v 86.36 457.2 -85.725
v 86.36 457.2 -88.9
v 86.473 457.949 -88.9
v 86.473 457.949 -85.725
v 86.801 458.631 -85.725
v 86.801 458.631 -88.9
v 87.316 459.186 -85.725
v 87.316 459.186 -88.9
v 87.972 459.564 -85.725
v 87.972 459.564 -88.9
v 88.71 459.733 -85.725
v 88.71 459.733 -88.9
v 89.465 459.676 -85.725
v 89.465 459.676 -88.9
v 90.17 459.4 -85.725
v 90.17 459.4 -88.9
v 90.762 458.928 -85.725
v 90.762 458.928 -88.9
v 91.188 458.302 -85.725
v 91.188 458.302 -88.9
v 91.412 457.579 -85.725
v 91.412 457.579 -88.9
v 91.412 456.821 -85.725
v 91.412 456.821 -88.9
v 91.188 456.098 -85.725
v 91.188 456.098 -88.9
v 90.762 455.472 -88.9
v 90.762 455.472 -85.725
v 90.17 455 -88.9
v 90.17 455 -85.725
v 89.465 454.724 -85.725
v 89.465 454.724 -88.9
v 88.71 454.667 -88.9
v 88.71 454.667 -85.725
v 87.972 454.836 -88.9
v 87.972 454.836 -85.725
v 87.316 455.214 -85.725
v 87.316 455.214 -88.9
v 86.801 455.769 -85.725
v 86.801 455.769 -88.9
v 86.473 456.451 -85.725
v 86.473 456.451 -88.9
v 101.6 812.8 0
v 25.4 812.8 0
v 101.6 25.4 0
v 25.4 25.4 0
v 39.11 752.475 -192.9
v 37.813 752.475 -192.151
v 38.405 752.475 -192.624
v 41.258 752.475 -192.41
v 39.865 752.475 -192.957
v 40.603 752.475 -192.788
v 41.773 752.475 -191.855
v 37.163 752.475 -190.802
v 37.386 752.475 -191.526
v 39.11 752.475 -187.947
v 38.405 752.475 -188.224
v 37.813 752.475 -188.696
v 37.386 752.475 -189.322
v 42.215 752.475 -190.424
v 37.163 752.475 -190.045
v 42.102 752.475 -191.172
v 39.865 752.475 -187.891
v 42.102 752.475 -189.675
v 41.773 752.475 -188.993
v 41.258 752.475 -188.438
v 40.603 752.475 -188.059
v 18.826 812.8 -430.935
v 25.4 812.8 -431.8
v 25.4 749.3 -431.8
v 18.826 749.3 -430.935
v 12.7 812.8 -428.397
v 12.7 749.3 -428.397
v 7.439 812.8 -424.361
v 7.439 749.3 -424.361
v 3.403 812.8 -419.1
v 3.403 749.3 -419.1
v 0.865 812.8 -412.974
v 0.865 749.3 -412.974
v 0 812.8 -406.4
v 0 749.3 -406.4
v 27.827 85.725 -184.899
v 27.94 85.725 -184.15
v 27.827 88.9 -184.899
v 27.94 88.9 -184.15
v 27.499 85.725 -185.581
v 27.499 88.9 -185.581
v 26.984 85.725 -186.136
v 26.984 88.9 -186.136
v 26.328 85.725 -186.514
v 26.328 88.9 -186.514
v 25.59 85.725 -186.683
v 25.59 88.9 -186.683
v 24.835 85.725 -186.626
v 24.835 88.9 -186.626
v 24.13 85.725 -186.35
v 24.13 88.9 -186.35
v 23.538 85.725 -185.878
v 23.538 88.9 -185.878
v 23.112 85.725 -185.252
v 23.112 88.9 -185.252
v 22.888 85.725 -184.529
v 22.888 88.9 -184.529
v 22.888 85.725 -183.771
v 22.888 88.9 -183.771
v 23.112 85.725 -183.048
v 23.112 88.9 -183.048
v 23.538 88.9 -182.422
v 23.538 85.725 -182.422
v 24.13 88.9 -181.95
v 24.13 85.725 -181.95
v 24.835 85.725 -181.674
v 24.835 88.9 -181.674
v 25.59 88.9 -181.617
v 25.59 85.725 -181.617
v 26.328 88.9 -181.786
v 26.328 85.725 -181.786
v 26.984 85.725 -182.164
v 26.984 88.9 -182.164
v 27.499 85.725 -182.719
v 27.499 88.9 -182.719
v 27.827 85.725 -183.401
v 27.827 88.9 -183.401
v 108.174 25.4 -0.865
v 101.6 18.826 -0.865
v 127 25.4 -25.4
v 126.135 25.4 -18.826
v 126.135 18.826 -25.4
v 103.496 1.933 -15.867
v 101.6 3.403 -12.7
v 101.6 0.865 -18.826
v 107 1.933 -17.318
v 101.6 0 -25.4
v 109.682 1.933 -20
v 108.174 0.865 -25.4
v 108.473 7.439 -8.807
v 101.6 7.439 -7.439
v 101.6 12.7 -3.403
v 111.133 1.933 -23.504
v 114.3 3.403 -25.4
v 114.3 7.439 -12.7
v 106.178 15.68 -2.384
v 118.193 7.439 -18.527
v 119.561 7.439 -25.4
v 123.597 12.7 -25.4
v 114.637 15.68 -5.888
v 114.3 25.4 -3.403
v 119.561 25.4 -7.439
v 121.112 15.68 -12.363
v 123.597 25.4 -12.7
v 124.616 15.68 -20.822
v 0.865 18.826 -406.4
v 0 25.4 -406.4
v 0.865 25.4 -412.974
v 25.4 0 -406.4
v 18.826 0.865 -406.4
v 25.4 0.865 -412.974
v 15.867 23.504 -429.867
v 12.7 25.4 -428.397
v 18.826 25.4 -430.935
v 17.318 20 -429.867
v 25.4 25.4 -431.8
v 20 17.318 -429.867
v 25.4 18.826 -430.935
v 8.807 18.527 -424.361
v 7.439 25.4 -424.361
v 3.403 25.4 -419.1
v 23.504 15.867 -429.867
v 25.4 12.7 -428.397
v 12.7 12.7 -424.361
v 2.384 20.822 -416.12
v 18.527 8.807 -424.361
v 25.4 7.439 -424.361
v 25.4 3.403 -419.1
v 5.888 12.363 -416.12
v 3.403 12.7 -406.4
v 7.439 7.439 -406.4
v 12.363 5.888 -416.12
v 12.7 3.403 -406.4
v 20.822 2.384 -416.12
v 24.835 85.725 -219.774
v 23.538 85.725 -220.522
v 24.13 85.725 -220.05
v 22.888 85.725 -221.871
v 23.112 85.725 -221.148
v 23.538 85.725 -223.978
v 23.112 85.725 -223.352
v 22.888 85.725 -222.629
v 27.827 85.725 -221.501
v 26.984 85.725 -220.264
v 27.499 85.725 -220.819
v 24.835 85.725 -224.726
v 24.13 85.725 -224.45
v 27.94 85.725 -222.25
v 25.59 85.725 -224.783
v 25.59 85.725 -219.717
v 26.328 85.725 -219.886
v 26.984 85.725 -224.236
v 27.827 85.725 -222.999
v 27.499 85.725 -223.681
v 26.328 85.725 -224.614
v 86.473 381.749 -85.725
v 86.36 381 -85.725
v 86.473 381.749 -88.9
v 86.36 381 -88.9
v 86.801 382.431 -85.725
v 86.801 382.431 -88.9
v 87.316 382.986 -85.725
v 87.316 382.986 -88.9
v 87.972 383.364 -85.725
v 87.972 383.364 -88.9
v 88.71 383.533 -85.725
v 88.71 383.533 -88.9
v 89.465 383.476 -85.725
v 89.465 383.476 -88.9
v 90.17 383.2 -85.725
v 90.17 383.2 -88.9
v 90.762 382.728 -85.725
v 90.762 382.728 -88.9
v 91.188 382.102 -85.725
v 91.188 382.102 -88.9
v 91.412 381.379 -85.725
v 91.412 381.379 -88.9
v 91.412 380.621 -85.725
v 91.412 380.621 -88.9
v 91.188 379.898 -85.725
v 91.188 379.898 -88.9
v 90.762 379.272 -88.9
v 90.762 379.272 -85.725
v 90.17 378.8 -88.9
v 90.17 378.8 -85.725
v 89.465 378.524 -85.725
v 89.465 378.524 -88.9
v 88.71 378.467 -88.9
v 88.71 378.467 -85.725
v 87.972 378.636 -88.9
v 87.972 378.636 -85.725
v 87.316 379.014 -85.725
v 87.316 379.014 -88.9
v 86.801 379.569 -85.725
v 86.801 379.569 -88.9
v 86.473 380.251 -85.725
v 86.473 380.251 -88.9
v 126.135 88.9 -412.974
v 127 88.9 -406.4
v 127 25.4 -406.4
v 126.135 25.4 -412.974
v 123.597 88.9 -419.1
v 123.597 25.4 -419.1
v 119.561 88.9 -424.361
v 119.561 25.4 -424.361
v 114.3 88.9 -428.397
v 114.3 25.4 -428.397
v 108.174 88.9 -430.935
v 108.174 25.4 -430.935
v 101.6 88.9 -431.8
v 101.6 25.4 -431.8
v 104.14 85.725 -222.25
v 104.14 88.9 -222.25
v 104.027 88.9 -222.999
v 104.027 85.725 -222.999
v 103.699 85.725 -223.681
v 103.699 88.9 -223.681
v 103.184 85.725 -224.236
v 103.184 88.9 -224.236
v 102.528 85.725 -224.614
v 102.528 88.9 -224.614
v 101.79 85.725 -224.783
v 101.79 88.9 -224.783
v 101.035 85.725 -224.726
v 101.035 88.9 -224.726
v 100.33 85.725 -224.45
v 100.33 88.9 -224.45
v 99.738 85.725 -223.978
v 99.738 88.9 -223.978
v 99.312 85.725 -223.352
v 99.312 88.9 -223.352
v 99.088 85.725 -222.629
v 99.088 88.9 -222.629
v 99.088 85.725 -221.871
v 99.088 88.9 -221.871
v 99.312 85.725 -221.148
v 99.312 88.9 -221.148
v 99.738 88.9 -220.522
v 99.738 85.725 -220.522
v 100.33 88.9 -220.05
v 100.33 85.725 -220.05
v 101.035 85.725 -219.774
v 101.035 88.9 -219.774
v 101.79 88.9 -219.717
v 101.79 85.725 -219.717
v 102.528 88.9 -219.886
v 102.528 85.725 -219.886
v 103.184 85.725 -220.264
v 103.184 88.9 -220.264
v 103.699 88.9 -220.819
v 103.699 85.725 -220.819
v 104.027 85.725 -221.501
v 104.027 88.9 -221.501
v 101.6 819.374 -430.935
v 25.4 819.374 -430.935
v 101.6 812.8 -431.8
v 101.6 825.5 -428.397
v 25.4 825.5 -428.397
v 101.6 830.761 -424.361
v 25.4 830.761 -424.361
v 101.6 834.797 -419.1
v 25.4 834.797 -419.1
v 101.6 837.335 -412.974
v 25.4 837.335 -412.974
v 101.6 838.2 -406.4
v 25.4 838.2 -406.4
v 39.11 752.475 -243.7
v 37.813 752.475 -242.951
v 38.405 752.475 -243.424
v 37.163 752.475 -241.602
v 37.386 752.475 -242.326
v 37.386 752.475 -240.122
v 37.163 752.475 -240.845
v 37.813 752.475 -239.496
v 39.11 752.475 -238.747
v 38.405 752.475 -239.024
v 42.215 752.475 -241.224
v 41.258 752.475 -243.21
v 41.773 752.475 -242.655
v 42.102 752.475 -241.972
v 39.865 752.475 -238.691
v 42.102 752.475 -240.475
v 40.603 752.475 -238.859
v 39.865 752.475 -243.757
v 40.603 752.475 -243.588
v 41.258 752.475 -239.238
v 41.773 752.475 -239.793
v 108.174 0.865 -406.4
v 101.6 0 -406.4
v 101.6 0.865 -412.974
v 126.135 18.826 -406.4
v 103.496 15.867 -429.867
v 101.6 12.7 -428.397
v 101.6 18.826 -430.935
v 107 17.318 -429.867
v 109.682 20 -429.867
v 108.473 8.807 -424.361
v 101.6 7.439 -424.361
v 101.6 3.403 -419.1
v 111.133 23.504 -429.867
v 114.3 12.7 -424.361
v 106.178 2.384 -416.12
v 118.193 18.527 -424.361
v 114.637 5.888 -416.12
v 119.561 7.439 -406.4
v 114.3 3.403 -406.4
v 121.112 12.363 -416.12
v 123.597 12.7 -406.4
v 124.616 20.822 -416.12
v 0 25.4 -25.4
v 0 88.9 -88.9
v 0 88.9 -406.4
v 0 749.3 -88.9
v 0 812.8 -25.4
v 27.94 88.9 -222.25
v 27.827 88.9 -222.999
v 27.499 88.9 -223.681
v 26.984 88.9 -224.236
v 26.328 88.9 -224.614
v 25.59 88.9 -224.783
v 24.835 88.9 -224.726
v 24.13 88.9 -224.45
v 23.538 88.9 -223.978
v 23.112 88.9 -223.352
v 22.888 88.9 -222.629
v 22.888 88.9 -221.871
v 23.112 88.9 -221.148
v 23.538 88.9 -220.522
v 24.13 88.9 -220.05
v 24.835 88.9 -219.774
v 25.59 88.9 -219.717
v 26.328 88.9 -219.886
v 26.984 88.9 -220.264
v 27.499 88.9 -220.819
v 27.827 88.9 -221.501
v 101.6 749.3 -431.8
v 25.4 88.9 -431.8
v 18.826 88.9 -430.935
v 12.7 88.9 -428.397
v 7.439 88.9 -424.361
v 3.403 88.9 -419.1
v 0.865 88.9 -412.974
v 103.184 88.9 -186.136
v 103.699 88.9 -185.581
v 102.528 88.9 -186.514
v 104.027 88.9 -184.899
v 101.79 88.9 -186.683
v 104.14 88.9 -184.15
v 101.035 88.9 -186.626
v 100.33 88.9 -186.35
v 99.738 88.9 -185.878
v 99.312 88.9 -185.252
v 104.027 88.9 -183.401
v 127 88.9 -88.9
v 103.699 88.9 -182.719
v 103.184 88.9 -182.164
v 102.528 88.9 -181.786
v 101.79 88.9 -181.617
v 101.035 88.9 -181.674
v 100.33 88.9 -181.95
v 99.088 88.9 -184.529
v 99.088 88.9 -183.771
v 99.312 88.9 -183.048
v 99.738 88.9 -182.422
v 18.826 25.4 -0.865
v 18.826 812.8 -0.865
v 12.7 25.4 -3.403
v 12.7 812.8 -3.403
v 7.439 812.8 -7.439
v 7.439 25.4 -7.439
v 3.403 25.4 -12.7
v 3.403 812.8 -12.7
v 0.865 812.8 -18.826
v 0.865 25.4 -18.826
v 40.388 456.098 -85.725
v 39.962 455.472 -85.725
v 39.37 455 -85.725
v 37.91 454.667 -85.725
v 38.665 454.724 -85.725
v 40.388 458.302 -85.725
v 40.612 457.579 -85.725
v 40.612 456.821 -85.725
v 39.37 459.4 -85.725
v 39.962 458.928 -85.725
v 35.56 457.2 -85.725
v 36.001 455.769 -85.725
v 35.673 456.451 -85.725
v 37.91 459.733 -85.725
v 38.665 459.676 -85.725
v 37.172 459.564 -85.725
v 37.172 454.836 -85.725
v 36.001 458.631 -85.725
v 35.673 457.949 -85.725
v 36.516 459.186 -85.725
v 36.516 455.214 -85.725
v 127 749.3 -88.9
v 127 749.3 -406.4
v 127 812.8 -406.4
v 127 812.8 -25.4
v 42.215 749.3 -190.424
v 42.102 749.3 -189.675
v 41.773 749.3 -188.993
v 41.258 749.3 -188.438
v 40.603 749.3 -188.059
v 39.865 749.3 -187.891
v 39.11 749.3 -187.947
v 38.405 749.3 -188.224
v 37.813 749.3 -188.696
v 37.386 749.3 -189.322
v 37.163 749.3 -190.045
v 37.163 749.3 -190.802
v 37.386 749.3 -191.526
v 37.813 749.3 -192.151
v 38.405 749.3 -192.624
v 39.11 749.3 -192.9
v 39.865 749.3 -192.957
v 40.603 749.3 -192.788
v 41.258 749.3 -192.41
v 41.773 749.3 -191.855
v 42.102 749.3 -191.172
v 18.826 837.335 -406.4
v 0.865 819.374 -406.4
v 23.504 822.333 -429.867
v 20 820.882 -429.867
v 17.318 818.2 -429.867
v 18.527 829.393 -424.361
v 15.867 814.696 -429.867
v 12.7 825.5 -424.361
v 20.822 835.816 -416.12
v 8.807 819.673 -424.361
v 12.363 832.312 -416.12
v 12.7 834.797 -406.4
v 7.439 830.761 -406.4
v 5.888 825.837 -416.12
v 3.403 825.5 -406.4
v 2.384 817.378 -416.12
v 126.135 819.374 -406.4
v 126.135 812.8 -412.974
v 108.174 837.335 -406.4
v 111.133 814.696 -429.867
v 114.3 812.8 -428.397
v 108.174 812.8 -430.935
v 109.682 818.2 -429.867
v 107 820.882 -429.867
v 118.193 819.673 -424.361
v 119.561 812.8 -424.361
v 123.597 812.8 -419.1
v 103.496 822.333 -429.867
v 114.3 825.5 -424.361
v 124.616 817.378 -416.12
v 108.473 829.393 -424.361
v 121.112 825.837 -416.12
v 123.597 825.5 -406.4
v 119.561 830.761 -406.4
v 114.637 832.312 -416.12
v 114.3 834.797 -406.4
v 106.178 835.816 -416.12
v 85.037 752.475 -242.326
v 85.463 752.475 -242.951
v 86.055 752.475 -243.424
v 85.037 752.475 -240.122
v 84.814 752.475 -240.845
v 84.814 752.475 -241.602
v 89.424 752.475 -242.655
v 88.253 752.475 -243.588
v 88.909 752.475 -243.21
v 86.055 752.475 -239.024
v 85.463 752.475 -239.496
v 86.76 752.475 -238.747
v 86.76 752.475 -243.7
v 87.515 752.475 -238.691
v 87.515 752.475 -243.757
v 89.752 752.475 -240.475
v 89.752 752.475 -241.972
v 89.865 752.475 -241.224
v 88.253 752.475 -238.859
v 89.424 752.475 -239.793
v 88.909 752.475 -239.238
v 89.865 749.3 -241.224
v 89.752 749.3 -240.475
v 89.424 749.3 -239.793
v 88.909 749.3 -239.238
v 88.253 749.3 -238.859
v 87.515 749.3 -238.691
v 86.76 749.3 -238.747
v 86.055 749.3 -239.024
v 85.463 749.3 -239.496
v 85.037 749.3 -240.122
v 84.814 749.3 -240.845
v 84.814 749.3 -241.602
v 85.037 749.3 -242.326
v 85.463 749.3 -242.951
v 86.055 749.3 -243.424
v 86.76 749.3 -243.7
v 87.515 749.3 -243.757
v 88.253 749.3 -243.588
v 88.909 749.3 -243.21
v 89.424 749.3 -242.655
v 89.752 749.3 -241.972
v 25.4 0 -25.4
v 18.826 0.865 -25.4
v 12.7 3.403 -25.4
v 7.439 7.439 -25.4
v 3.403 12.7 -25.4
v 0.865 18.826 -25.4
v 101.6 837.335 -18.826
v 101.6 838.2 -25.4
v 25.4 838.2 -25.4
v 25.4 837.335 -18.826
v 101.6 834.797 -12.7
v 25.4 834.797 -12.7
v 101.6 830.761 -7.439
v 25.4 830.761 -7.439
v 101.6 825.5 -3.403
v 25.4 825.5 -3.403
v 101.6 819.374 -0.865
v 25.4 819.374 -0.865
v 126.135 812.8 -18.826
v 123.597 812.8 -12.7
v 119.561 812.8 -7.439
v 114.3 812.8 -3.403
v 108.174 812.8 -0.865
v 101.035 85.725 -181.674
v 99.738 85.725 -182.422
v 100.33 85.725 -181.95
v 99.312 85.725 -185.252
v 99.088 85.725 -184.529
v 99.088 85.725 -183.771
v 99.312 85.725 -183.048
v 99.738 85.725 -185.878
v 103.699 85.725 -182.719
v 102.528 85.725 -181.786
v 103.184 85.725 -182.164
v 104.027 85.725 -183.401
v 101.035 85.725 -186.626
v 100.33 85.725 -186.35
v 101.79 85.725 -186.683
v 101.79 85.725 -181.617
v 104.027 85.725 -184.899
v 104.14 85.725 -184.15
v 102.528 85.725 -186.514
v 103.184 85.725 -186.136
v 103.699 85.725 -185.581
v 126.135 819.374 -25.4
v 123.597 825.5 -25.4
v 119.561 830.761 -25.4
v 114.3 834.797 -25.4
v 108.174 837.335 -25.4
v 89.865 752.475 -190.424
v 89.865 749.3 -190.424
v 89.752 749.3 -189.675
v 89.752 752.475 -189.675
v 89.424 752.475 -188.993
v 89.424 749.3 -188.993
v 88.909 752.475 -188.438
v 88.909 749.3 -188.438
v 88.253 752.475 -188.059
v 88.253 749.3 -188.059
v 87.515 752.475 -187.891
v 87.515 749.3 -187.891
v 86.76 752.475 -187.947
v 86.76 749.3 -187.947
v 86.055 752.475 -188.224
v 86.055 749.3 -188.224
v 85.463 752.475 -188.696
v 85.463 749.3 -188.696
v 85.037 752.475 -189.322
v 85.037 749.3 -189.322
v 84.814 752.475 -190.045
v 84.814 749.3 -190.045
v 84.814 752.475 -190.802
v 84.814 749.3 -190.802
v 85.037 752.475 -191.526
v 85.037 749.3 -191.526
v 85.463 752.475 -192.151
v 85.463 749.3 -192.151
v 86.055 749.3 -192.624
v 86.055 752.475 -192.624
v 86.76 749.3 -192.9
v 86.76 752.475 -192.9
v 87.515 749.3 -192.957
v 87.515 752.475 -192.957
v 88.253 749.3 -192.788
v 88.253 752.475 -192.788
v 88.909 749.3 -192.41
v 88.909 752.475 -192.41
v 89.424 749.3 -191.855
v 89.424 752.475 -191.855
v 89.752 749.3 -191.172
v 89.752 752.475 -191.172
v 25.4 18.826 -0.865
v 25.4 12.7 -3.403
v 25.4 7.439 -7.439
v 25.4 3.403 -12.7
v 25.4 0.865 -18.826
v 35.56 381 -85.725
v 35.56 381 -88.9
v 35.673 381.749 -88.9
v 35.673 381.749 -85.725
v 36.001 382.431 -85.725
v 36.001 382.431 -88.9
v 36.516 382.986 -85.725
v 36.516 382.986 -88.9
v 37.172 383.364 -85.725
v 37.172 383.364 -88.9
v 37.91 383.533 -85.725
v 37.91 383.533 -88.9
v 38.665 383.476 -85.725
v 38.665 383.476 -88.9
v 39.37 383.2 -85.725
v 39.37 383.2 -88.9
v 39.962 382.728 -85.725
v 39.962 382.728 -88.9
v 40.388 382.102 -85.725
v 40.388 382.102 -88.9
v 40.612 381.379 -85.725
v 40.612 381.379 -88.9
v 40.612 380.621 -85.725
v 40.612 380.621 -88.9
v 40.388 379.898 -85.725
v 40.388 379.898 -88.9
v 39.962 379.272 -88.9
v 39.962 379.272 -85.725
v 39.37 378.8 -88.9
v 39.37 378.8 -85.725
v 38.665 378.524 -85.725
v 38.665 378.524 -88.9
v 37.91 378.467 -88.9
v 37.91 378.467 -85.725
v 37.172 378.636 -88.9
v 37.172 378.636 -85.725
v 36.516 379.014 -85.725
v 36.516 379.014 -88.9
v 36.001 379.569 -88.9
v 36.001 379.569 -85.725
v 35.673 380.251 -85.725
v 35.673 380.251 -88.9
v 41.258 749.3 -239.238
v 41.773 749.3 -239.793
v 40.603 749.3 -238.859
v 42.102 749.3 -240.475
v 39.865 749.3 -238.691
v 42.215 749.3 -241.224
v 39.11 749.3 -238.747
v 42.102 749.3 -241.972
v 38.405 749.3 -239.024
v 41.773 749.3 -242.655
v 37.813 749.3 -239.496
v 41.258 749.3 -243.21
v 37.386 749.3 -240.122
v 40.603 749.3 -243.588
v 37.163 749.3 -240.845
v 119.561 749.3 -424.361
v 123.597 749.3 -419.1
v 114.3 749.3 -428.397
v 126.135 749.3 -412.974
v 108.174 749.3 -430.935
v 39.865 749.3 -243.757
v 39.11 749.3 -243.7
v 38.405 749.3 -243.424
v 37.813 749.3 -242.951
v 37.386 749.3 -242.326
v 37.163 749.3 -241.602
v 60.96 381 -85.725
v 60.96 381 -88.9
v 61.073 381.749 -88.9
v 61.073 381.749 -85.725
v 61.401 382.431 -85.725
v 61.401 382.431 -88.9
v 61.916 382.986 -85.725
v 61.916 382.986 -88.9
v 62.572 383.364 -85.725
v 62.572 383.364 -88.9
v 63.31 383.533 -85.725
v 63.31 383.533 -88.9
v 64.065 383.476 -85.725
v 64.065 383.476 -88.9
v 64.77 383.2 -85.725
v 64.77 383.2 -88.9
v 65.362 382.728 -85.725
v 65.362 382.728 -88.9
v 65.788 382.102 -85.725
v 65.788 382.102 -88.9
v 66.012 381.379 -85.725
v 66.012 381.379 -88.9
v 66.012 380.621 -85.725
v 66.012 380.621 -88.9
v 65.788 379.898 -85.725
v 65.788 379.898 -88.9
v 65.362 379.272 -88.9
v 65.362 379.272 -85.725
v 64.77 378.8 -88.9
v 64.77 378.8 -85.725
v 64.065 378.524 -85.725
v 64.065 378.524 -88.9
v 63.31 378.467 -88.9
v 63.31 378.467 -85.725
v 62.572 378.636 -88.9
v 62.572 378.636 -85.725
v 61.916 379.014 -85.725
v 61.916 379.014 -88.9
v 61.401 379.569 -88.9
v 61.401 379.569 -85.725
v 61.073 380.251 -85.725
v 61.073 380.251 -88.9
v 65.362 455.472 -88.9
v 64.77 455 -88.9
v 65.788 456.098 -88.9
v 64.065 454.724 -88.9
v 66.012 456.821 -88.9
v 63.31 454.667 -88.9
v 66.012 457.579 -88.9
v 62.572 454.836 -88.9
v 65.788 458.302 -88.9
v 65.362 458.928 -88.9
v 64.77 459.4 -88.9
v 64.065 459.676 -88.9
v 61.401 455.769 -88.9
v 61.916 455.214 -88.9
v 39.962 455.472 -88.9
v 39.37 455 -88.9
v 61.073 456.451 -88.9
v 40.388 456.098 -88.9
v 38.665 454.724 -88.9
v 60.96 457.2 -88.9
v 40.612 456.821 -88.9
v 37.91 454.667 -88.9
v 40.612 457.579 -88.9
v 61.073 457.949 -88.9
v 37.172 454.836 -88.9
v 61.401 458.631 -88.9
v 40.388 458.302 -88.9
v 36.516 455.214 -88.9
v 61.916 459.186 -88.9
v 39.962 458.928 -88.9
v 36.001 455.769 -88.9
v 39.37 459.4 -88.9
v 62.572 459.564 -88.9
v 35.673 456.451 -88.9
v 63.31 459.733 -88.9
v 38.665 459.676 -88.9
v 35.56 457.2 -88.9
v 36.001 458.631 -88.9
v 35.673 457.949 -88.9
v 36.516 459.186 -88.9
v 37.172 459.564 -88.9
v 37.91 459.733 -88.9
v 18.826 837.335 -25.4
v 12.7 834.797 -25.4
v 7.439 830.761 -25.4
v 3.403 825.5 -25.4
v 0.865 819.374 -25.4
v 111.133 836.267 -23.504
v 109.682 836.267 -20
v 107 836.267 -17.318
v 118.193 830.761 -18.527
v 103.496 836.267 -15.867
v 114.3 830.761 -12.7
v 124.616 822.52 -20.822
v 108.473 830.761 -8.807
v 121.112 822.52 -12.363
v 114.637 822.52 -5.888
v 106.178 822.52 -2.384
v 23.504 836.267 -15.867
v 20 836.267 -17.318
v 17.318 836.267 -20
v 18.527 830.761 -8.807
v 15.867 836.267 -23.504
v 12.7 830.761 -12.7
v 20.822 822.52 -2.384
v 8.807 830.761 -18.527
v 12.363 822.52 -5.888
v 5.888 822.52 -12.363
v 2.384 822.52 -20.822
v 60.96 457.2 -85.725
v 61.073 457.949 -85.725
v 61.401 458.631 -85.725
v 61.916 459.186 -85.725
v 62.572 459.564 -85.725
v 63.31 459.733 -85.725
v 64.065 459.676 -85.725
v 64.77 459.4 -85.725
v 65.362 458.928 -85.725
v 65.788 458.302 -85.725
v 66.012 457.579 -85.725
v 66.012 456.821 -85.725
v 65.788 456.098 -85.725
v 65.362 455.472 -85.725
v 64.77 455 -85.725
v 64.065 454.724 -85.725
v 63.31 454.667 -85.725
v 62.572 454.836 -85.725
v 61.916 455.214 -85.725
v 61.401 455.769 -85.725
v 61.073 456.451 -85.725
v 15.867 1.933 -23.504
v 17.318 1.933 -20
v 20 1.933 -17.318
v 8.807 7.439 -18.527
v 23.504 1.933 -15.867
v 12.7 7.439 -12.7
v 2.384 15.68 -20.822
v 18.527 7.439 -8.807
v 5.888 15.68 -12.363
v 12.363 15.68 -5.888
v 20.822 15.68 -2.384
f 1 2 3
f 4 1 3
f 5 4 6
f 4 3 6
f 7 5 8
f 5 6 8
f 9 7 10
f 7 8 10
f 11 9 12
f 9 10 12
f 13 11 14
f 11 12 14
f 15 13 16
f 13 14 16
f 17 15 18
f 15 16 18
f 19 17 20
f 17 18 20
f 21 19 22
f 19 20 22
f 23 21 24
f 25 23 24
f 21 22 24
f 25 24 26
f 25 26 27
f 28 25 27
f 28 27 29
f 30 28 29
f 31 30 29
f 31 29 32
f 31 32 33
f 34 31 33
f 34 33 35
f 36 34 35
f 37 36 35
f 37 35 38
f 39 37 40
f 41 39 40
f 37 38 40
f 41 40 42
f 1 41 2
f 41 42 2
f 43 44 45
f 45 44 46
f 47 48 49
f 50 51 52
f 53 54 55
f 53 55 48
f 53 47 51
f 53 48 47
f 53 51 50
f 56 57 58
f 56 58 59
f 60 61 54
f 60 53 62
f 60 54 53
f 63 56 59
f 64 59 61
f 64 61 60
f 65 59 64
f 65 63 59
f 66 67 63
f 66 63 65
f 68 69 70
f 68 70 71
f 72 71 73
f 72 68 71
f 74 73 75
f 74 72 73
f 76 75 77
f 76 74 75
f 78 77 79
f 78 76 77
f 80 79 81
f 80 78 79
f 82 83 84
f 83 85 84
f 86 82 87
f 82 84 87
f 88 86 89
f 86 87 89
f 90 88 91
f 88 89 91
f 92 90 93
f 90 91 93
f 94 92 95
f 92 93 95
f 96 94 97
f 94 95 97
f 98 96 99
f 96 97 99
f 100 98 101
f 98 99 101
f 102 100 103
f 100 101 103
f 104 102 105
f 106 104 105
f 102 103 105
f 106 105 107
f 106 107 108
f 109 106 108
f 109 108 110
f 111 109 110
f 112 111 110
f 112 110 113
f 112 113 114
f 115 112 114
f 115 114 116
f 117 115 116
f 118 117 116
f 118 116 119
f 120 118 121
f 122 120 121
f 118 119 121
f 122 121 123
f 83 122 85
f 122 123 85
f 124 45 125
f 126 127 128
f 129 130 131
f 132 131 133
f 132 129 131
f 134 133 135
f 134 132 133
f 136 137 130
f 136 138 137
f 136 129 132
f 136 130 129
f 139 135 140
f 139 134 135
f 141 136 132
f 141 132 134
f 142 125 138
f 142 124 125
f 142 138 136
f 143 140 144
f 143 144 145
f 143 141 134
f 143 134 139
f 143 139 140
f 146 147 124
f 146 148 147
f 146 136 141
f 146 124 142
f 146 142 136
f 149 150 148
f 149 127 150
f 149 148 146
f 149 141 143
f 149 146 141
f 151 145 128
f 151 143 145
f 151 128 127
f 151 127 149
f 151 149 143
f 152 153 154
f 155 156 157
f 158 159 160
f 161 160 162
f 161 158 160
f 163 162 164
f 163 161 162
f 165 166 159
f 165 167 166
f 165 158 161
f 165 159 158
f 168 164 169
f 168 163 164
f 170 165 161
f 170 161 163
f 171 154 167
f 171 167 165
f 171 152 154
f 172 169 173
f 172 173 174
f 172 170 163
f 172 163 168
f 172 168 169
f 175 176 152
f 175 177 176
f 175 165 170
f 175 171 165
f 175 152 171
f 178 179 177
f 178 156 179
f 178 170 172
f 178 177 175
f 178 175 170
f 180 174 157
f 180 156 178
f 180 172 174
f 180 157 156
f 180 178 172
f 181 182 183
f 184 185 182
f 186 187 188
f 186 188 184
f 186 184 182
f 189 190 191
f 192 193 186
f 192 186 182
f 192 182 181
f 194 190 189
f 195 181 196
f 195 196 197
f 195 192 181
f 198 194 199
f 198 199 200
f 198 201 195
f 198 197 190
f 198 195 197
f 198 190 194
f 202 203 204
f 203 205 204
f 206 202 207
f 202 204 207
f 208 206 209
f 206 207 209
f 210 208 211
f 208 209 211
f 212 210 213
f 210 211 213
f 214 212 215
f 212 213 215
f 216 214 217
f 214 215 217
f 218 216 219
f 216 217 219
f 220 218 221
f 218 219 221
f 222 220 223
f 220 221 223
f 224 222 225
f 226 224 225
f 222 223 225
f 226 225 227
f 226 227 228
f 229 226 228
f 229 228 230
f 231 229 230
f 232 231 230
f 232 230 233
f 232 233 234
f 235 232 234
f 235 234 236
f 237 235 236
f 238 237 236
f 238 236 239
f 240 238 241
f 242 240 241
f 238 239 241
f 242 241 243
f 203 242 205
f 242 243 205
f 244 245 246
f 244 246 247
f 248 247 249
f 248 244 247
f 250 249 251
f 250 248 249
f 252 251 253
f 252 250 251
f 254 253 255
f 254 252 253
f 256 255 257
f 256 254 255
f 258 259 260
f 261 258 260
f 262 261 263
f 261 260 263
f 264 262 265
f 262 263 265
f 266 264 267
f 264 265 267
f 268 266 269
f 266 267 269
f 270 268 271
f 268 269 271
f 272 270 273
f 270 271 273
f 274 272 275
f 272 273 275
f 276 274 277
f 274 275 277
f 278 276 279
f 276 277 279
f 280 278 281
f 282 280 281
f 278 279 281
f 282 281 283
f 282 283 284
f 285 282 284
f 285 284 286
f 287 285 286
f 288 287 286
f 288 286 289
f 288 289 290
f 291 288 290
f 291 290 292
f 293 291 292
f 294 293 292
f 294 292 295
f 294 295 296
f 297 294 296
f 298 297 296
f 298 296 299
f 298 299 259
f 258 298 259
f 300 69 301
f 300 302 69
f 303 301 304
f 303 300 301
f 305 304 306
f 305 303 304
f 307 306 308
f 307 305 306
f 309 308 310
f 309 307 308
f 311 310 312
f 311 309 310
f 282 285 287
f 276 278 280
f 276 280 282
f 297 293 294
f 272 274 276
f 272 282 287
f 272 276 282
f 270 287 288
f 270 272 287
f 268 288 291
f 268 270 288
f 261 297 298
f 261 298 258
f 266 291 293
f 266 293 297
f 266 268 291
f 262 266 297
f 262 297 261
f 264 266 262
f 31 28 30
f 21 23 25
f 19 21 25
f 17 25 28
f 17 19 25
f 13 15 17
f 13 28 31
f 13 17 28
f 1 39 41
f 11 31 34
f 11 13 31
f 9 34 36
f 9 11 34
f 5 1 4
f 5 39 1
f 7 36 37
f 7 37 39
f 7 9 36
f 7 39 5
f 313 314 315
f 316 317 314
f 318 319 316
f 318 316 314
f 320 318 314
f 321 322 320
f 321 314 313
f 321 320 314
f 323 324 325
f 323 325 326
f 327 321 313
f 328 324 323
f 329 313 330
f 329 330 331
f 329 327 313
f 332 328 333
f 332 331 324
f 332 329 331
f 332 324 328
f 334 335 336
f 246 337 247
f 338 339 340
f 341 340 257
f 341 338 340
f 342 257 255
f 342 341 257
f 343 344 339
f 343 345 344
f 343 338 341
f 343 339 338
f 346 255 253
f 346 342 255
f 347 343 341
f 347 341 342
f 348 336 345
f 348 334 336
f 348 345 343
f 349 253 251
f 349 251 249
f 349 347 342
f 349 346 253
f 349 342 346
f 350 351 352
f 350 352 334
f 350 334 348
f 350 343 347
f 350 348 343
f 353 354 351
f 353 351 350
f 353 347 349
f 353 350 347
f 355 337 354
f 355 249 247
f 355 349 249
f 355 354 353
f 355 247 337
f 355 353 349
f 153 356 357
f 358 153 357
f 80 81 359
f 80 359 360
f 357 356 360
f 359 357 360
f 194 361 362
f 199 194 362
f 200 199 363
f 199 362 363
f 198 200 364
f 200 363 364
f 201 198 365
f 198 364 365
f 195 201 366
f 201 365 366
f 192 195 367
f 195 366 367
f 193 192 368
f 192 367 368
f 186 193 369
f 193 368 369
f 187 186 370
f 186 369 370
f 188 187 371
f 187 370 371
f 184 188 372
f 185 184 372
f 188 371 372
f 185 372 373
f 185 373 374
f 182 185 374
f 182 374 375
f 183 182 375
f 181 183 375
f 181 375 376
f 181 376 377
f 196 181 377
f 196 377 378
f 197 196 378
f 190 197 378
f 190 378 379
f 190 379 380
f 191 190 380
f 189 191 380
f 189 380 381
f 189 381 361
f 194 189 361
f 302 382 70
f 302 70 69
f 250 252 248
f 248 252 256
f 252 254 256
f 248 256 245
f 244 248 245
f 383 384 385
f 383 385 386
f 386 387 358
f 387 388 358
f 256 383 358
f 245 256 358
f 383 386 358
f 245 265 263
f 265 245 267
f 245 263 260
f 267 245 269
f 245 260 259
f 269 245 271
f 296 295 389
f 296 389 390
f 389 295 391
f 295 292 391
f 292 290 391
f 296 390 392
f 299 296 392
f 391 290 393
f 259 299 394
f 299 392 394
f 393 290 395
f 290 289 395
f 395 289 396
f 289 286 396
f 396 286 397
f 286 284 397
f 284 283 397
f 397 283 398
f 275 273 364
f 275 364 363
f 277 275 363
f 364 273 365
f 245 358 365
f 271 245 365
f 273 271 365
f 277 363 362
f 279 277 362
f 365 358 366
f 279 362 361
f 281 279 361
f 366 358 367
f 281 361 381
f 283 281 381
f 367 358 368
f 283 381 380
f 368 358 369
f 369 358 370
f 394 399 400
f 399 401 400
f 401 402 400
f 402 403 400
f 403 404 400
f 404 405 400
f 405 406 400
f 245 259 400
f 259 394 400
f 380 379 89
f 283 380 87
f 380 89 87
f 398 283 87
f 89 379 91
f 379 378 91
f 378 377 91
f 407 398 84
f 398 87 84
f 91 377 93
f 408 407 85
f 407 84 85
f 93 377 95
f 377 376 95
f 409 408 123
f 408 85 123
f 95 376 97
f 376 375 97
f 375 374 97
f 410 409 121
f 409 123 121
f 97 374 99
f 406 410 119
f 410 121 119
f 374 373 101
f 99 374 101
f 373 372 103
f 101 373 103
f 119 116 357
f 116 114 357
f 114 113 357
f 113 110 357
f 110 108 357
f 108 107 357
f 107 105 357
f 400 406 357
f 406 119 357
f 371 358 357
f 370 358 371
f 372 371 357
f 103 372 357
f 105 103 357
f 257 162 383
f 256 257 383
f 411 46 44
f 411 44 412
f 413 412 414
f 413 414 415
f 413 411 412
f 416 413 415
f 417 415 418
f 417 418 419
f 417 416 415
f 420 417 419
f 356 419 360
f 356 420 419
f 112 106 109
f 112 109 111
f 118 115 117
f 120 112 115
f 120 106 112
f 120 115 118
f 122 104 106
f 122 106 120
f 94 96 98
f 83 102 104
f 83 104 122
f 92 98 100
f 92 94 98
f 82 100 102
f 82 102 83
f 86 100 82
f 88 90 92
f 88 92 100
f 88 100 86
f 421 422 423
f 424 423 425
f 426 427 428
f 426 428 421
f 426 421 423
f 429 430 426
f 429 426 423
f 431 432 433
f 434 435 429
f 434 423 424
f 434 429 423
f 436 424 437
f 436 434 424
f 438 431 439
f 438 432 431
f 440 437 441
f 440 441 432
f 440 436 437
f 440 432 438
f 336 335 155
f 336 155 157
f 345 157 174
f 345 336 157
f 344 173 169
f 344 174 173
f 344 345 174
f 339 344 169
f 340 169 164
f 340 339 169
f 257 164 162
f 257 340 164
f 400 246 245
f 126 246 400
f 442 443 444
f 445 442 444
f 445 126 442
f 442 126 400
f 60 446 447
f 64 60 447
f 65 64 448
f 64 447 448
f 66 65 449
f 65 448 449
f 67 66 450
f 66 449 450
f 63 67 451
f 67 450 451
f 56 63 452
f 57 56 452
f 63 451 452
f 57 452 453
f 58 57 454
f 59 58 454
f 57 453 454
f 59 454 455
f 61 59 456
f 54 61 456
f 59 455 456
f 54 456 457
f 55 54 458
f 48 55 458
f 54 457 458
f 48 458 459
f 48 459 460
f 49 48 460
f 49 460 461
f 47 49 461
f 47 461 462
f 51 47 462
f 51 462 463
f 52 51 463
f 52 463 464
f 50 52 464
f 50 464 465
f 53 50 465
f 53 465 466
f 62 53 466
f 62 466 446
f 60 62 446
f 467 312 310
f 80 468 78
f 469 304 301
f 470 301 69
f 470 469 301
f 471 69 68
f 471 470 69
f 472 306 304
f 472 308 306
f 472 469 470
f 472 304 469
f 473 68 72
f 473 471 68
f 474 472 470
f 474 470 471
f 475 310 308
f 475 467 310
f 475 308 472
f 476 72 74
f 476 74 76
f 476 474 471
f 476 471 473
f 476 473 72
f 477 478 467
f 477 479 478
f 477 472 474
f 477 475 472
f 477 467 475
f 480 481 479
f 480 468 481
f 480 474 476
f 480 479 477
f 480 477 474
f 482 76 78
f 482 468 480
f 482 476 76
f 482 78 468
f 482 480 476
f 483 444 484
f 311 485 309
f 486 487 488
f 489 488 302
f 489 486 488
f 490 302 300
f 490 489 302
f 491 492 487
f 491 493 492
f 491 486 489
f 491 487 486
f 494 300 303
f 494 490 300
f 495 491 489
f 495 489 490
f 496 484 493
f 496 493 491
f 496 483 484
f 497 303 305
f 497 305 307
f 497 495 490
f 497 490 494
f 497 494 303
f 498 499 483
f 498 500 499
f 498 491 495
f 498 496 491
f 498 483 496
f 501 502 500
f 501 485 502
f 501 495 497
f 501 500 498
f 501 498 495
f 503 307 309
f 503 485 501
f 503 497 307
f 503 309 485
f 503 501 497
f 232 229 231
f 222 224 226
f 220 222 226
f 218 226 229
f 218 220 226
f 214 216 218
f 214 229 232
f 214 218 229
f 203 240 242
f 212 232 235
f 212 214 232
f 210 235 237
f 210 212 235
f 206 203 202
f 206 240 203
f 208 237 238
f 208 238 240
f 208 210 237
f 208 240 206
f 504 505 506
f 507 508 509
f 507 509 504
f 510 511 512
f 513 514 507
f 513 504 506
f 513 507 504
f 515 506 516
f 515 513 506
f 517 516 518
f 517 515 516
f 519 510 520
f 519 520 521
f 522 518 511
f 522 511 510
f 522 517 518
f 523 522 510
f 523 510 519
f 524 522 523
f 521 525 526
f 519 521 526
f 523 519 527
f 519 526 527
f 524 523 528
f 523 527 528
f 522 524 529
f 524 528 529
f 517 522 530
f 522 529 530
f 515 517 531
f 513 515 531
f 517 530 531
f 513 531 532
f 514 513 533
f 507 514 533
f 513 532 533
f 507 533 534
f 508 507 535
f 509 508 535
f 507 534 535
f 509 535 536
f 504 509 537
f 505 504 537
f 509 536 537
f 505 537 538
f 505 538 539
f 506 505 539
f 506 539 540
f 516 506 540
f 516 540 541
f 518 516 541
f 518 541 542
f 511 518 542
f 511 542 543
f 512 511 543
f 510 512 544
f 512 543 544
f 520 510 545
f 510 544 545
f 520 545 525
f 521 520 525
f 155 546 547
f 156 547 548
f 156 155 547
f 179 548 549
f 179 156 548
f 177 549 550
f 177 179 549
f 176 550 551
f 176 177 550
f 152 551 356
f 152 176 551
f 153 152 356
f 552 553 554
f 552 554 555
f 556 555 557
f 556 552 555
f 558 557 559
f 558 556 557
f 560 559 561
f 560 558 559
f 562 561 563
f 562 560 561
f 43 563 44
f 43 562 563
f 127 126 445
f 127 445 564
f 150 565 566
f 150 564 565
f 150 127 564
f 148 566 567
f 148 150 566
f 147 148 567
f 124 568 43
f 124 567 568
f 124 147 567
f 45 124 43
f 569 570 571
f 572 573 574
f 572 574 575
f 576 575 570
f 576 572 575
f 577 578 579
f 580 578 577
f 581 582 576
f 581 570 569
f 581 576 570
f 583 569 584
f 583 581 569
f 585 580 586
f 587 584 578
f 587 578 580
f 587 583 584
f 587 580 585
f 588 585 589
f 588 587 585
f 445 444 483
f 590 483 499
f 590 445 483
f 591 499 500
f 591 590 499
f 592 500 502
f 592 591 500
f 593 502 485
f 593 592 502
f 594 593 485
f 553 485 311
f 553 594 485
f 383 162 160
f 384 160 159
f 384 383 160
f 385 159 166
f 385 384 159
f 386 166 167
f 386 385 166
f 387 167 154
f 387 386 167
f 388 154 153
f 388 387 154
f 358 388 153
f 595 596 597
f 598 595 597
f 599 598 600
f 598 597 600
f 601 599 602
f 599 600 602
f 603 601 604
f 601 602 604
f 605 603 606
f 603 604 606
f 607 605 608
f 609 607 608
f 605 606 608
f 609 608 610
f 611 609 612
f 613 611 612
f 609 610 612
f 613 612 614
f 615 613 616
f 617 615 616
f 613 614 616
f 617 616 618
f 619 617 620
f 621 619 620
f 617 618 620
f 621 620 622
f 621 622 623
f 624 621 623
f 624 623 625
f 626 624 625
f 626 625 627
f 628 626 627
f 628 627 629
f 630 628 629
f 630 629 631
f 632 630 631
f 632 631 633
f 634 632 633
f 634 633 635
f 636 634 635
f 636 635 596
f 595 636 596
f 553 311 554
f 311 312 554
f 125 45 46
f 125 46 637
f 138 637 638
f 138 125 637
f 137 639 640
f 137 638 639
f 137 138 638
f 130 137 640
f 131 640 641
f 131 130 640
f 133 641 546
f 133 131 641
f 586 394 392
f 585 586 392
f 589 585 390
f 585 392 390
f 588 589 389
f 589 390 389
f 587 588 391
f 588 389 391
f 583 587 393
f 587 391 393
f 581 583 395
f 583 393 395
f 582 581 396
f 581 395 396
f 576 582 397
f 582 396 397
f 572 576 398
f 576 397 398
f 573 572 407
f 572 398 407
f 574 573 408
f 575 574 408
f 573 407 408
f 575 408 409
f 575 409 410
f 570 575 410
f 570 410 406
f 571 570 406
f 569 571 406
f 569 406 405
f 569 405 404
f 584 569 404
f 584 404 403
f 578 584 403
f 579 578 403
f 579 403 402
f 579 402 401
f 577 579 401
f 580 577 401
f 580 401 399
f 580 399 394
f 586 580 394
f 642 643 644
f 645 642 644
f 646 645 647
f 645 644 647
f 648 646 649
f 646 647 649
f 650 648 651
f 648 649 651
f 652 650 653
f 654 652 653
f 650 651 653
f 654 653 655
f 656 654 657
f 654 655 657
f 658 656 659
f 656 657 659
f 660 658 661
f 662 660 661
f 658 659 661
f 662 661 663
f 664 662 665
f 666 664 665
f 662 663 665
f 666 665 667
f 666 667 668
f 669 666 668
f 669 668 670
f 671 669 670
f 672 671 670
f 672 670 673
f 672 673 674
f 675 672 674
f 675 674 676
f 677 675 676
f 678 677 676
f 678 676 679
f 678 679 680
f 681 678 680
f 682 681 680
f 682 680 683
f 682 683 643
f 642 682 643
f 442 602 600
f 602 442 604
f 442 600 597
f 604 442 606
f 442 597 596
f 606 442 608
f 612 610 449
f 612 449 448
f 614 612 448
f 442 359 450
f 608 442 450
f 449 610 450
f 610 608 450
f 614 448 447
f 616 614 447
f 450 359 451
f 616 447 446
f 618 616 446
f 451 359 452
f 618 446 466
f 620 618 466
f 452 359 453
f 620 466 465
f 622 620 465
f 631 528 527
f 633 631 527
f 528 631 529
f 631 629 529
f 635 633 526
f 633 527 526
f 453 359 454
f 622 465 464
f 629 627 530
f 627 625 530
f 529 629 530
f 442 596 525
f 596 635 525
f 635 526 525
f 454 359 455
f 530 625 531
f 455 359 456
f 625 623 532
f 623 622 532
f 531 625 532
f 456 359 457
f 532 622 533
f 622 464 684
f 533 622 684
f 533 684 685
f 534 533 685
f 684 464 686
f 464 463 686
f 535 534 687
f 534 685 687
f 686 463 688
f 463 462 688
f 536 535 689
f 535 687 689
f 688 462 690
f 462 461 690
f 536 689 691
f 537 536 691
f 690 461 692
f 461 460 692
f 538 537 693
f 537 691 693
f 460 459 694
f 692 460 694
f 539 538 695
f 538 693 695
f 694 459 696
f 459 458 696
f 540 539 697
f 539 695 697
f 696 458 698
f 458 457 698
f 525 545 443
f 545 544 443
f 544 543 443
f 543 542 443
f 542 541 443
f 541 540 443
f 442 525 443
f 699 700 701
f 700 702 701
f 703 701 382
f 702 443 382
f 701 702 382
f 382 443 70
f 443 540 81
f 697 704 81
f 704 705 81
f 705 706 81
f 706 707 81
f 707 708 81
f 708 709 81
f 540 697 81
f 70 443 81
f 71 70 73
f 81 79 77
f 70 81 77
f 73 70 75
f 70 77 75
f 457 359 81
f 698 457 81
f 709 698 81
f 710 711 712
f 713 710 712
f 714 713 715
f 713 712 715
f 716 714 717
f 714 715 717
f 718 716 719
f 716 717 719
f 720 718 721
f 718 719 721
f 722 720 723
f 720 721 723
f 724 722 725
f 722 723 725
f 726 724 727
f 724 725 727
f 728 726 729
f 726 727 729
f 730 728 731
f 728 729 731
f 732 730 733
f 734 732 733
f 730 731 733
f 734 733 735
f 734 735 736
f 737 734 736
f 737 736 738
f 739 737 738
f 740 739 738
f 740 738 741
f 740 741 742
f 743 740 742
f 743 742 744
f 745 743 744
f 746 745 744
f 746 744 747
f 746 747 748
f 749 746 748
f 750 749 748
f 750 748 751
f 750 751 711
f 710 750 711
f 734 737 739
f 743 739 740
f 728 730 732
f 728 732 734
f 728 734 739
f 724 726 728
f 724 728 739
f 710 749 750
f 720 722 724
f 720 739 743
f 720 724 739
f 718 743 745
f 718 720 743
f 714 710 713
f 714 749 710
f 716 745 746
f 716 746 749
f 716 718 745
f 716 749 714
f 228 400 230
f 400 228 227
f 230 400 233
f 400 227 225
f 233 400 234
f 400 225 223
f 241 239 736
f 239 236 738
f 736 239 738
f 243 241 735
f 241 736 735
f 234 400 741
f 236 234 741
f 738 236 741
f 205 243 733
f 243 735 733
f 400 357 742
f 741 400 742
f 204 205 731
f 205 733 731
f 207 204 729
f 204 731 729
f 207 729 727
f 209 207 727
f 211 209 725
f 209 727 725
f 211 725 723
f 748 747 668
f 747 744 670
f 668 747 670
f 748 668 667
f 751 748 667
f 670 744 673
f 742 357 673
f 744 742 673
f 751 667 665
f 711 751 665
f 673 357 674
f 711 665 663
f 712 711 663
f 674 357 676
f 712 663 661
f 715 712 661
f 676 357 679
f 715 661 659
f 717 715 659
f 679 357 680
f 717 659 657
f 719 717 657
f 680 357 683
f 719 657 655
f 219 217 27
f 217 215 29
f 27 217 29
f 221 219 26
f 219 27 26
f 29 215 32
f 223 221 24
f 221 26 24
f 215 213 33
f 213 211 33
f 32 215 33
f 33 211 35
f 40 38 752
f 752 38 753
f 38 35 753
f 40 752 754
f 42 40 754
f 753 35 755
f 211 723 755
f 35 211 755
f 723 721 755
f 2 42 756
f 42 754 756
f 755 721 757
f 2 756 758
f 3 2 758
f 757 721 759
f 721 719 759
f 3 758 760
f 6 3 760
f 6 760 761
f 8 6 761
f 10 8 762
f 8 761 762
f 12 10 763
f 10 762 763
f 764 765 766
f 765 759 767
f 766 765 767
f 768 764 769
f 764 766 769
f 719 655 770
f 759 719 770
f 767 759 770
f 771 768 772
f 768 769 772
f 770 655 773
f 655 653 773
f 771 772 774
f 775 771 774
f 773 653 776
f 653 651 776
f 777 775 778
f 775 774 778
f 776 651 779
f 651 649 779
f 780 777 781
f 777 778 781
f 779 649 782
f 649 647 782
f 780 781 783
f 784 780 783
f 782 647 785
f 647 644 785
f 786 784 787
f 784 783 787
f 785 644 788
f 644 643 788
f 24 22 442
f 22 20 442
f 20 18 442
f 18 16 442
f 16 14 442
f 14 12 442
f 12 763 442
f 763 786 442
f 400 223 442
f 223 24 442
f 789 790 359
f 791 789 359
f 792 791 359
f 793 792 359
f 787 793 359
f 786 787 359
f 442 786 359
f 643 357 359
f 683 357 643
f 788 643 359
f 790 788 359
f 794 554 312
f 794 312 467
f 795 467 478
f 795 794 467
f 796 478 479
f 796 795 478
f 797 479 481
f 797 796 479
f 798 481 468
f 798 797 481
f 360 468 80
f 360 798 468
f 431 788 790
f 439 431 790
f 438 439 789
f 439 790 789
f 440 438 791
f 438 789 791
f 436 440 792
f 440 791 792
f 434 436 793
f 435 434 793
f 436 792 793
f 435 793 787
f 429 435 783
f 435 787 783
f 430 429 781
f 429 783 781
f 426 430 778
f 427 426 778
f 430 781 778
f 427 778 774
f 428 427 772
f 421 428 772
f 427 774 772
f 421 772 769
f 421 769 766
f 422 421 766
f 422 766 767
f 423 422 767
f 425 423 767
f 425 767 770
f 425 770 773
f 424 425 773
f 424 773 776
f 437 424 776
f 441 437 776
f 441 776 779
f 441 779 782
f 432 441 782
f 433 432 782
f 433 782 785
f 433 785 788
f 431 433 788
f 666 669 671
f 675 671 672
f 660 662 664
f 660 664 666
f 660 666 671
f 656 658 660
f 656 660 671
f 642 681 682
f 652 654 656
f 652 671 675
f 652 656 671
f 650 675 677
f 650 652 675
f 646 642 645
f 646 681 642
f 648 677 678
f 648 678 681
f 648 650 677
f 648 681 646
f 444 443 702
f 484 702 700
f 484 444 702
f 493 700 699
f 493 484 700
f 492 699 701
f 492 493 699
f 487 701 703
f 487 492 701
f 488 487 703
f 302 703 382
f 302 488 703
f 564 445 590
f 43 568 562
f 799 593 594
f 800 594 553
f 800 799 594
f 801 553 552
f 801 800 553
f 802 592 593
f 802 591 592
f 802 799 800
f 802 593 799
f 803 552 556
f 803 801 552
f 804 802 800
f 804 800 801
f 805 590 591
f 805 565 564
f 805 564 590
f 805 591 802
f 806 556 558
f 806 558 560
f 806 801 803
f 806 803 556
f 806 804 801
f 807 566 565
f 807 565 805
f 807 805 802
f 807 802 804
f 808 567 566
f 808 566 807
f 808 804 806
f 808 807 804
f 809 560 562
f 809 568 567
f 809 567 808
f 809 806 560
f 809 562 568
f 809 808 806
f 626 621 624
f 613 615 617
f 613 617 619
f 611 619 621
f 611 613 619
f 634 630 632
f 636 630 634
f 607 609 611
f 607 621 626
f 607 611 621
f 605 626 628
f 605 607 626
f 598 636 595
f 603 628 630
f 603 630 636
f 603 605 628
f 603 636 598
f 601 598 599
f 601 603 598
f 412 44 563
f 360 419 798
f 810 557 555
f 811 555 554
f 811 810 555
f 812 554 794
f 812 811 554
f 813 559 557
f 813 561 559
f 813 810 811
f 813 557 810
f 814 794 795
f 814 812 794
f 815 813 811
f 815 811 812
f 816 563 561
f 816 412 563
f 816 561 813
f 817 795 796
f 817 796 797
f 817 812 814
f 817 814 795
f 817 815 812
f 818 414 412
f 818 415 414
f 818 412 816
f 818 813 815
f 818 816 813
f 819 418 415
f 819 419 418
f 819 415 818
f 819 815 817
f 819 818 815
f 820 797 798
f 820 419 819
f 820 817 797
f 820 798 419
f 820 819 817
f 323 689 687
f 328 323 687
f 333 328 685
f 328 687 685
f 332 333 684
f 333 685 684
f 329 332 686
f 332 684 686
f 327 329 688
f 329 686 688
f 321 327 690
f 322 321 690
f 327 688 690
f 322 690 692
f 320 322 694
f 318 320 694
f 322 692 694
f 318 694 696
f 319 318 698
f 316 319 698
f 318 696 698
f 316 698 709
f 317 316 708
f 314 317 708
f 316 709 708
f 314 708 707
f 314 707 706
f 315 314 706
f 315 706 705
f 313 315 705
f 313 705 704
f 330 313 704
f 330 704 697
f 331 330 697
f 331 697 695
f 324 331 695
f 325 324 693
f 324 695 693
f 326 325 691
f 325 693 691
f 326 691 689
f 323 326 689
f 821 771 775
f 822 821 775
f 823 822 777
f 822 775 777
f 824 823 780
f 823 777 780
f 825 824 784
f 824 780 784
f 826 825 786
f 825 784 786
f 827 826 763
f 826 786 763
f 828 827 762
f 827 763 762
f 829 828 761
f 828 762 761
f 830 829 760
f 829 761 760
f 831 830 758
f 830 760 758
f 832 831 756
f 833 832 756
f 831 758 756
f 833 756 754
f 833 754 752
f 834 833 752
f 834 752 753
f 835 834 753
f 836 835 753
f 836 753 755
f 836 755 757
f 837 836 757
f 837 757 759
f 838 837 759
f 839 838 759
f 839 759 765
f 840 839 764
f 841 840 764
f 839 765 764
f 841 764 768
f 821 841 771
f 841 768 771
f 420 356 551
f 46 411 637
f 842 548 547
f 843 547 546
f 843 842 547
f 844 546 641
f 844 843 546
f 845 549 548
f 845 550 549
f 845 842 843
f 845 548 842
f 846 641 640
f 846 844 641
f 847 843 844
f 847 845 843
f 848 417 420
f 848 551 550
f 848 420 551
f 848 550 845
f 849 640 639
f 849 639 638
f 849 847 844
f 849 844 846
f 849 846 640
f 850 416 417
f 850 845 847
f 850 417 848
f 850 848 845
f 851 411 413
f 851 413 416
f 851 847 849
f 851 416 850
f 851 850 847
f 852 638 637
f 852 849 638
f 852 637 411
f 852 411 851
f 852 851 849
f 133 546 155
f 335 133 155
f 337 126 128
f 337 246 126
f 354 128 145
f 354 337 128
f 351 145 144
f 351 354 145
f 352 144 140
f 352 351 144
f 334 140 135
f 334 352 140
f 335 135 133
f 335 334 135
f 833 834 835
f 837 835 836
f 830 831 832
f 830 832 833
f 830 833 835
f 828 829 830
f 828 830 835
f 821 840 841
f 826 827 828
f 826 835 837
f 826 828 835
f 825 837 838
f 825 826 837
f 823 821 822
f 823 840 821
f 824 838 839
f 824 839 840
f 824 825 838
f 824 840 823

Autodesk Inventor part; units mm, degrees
ref_plane "YZ Plane" through (0, 0, 0) normal (1, 0, 0) x (0, 1, 0)
ref_plane "XZ Plane" through (0, 0, 0) normal (0, 1, 0) x (-1, 0, 0)
ref_plane "XY Plane" through (0, 0, 0) normal (0, 0, 1) x (1, 0, 0)
sketch "Sketch1" plane through (0, 0, 0) normal (1, 0, 0) x (0, 1, 0)
  point P0 (0, 0)
sketch "Sketch2" plane through (0, 0, 0) normal (1, 0, 0) x (0, 1, 0)
  line L0 (0, 0) -> (0, -431.8)
  line L1 (0, -431.8) -> (88.9, -431.8)
  line L2 (88.9, -431.8) -> (88.9, -88.9)
  line L3 (88.9, -88.9) -> (749.3, -88.9)
  line L4 (749.3, -88.9) -> (749.3, -431.8)
  line L5 (749.3, -431.8) -> (838.2, -431.8)
  line L6 (838.2, -431.8) -> (838.2, 0)
  line L7 (838.2, 0) -> (0, 0)
  dimension "d0" = 660.4
  dimension "d1" = 342.9
  dimension "d2" = 342.9
  dimension "d3" = 88.9
  dimension "d4" = 88.9
  dimension "d5" = 88.9
extrude "Extrusion1" add sketch "Sketch2" along normal blind 127
fillet "Fillet1" radius 25.4 14 edges at (127, 419.1, 0) (0, 419.1, 0) (63.5, 838.2, 0) (127, 838.2, -215.9) (0, 838.2, -215.9) (63.5, 0, 0) (127, 0, -215.9) (127, 44.45, -431.8) (127, 793.75, -431.8) (63.5, 838.2, -431.8) (0, 793.75, -431.8) (0, 0, -215.9) (0, 44.45, -431.8) (63.5, 0, -431.8)
sketch "Sketch3" plane through (0, 88.9, -88.9) normal (0, 0, -1) x (-1, 0, 0)
  line L0 (0, 0) -> (-127, 0) projected
  line L1 (-63.5, 0) -> (-63.5, 660.4)
  line L2 (-25.4, 660.4) -> (-101.6, 660.4) projected
  line L3 (-63.5, 0) -> (-63.5, 254)
  line L4 (-63.5, 254) -> (-63.5, 406.4)
  line L5 (-63.5, 406.4) -> (-63.5, 660.4)
  line L6 (-63.5, 254) -> (-63.5, 292.1)
  line L7 (-63.5, 406.4) -> (-63.5, 368.3)
  circle A0 centre (-63.5, 292.1) radius 2.54
  circle A1 centre (-63.5, 368.3) radius 2.54
  line L8 (0, 0) -> (0, 660.4) projected
  line L9 (0, 406.4) -> (0, 368.3)
  line L10 (-127, 0) -> (-127, 660.4) projected
  line L11 (-60.96, 292.1) -> (-66.04, 292.1)
  line L12 (-63.5, 254) -> (-127, 254)
  line L13 (-127, 254) -> (-127, 292.1)
  line L14 (-127, 292.1) -> (-88.9, 292.1)
  line L15 (-127, 368.3) -> (-88.9, 368.3)
  line L16 (0, 292.1) -> (-38.1, 292.1)
  line L17 (0, 368.3) -> (-38.1, 368.3)
  circle A2 centre (-88.9, 292.1) radius 2.54
  circle A3 centre (-88.9, 368.3) radius 2.54
  circle A4 centre (-38.1, 368.3) radius 2.54
  circle A5 centre (-38.1, 292.1) radius 2.54
  point P0 (0, -88.9)
  dimension "d9" = 254
  dimension "d10" = 152.4
  dimension "d23" = 38.1
  dimension "d24" = 38.1
  dimension "d25" = 38.1
extrude "Extrusion2" cut sketch "Sketch3" against normal blind 3.175 contours A1 L1 | L1 A1 | A0 L11 L1 | L1 L11 A0 | L11 A0 L1 | L1 A0 L11
sketch "Sketch4" plane through (0, 88.9, -88.9) normal (0, 0, -1) x (-1, 0, 0)
  line L0 (0, 0) -> (-127, 0) projected
  line L1 (0, 0) -> (0, 292.1)
  line L2 (0, 0) -> (0, 660.4) projected
  line L3 (0, 292.1) -> (0, 368.3)
  line L4 (0, 292.1) -> (-38.1, 292.1)
  line L5 (0, 368.3) -> (-38.1, 368.3)
  line L6 (-127, 0) -> (-127, 660.4) projected
  line L7 (-127, 292.1) -> (-88.9, 292.1)
  line L8 (-127, 368.3) -> (-88.9, 368.3)
  circle A0 centre (-88.9, 292.1) radius 2.54
  circle A1 centre (-38.1, 292.1) radius 2.54
  circle A2 centre (-38.1, 368.3) radius 2.54
  circle A3 centre (-88.9, 368.3) radius 2.54
  point P0 (0, -88.9)
  dimension "d26" = 292.1
  dimension "d27" = 76.2
  dimension "d28" = 38.1
  dimension "d30" = 38.1
  dimension "d31" = 5.08
  dimension "d50" = 38.1
  dimension "d51" = 38.1
extrude "Extrusion3" cut sketch "Sketch4" against normal blind 3.175
sketch "Sketch5" plane through (0, 749.3, -88.9) normal (0, -1, 0) x (1, 0, 0)
  line L0 (0, 0) -> (0, -317.5) projected
  line L1 (0, -152.3238) -> (87.3252, -152.3238)
  line L2 (25.4, -342.9) -> (101.6, -342.9) projected
  line L3 (127, 0) -> (127, -317.5) projected
  line L4 (127, -152.3238) -> (39.6748, -152.3238)
  circle A0 centre (87.3252, -152.3238) radius 2.54
  circle A1 centre (39.6748, -152.3238) radius 2.54
  line L5 (87.3252, -152.3238) -> (87.3252, -101.5238)
  line L6 (39.6748, -152.3238) -> (39.6748, -101.5238)
  circle A2 centre (39.6748, -101.5238) radius 2.54
  circle A3 centre (87.3252, -101.5238) radius 2.54
  line L7 (87.3252, -101.5238) -> (87.3252, 0)
  point P0 (0, 88.9)
  dimension "d34" = 87.3252
  dimension "d36" = 87.3252
  dimension "d37" = 5.08
  dimension "d40" = 50.8
extrude "Extrusion5" cut sketch "Sketch5" against normal blind 3.175
sketch "Sketch6" plane through (0, 88.9, -88.9) normal (0, 1, 0) x (1, 0, 0)
  arc A0 (127, 317.5) -> (101.6, 342.9) centre (101.6, 317.5) ccw projected
  line L0 (127, 317.5) -> (127, 0) projected
  line L1 (101.6, 317.5) -> (25.4, 317.5) projected
  line L2 (101.6, 317.5) -> (127, 317.5)
  line L3 (101.6, -63.5) -> (101.6, 317.5) projected
  line L4 (101.6, 317.5) -> (101.6, 133.35)
  line L5 (101.6, 133.35) -> (101.6, 95.25)
  line L6 (25.4, 133.35) -> (25.4, 95.25)
  circle A1 centre (101.6, 133.35) radius 2.54
  circle A2 centre (101.6, 95.25) radius 2.54
  circle A3 centre (25.4, 95.25) radius 2.54
  circle A4 centre (25.4, 133.35) radius 2.54
  line L7 (101.6, -88.9) -> (25.4, -88.9) projected
  line L8 (101.6, 317.5) -> (101.6, -88.9)
  line L9 (25.4, 95.25) -> (25.4, 0)
  point P0 (0, -88.9)
  dimension "d46" = 38.1
  dimension "d47" = 5.08
extrude "Extrusion6" cut sketch "Sketch6" against normal blind 3.175
properties part number "Bumper"
